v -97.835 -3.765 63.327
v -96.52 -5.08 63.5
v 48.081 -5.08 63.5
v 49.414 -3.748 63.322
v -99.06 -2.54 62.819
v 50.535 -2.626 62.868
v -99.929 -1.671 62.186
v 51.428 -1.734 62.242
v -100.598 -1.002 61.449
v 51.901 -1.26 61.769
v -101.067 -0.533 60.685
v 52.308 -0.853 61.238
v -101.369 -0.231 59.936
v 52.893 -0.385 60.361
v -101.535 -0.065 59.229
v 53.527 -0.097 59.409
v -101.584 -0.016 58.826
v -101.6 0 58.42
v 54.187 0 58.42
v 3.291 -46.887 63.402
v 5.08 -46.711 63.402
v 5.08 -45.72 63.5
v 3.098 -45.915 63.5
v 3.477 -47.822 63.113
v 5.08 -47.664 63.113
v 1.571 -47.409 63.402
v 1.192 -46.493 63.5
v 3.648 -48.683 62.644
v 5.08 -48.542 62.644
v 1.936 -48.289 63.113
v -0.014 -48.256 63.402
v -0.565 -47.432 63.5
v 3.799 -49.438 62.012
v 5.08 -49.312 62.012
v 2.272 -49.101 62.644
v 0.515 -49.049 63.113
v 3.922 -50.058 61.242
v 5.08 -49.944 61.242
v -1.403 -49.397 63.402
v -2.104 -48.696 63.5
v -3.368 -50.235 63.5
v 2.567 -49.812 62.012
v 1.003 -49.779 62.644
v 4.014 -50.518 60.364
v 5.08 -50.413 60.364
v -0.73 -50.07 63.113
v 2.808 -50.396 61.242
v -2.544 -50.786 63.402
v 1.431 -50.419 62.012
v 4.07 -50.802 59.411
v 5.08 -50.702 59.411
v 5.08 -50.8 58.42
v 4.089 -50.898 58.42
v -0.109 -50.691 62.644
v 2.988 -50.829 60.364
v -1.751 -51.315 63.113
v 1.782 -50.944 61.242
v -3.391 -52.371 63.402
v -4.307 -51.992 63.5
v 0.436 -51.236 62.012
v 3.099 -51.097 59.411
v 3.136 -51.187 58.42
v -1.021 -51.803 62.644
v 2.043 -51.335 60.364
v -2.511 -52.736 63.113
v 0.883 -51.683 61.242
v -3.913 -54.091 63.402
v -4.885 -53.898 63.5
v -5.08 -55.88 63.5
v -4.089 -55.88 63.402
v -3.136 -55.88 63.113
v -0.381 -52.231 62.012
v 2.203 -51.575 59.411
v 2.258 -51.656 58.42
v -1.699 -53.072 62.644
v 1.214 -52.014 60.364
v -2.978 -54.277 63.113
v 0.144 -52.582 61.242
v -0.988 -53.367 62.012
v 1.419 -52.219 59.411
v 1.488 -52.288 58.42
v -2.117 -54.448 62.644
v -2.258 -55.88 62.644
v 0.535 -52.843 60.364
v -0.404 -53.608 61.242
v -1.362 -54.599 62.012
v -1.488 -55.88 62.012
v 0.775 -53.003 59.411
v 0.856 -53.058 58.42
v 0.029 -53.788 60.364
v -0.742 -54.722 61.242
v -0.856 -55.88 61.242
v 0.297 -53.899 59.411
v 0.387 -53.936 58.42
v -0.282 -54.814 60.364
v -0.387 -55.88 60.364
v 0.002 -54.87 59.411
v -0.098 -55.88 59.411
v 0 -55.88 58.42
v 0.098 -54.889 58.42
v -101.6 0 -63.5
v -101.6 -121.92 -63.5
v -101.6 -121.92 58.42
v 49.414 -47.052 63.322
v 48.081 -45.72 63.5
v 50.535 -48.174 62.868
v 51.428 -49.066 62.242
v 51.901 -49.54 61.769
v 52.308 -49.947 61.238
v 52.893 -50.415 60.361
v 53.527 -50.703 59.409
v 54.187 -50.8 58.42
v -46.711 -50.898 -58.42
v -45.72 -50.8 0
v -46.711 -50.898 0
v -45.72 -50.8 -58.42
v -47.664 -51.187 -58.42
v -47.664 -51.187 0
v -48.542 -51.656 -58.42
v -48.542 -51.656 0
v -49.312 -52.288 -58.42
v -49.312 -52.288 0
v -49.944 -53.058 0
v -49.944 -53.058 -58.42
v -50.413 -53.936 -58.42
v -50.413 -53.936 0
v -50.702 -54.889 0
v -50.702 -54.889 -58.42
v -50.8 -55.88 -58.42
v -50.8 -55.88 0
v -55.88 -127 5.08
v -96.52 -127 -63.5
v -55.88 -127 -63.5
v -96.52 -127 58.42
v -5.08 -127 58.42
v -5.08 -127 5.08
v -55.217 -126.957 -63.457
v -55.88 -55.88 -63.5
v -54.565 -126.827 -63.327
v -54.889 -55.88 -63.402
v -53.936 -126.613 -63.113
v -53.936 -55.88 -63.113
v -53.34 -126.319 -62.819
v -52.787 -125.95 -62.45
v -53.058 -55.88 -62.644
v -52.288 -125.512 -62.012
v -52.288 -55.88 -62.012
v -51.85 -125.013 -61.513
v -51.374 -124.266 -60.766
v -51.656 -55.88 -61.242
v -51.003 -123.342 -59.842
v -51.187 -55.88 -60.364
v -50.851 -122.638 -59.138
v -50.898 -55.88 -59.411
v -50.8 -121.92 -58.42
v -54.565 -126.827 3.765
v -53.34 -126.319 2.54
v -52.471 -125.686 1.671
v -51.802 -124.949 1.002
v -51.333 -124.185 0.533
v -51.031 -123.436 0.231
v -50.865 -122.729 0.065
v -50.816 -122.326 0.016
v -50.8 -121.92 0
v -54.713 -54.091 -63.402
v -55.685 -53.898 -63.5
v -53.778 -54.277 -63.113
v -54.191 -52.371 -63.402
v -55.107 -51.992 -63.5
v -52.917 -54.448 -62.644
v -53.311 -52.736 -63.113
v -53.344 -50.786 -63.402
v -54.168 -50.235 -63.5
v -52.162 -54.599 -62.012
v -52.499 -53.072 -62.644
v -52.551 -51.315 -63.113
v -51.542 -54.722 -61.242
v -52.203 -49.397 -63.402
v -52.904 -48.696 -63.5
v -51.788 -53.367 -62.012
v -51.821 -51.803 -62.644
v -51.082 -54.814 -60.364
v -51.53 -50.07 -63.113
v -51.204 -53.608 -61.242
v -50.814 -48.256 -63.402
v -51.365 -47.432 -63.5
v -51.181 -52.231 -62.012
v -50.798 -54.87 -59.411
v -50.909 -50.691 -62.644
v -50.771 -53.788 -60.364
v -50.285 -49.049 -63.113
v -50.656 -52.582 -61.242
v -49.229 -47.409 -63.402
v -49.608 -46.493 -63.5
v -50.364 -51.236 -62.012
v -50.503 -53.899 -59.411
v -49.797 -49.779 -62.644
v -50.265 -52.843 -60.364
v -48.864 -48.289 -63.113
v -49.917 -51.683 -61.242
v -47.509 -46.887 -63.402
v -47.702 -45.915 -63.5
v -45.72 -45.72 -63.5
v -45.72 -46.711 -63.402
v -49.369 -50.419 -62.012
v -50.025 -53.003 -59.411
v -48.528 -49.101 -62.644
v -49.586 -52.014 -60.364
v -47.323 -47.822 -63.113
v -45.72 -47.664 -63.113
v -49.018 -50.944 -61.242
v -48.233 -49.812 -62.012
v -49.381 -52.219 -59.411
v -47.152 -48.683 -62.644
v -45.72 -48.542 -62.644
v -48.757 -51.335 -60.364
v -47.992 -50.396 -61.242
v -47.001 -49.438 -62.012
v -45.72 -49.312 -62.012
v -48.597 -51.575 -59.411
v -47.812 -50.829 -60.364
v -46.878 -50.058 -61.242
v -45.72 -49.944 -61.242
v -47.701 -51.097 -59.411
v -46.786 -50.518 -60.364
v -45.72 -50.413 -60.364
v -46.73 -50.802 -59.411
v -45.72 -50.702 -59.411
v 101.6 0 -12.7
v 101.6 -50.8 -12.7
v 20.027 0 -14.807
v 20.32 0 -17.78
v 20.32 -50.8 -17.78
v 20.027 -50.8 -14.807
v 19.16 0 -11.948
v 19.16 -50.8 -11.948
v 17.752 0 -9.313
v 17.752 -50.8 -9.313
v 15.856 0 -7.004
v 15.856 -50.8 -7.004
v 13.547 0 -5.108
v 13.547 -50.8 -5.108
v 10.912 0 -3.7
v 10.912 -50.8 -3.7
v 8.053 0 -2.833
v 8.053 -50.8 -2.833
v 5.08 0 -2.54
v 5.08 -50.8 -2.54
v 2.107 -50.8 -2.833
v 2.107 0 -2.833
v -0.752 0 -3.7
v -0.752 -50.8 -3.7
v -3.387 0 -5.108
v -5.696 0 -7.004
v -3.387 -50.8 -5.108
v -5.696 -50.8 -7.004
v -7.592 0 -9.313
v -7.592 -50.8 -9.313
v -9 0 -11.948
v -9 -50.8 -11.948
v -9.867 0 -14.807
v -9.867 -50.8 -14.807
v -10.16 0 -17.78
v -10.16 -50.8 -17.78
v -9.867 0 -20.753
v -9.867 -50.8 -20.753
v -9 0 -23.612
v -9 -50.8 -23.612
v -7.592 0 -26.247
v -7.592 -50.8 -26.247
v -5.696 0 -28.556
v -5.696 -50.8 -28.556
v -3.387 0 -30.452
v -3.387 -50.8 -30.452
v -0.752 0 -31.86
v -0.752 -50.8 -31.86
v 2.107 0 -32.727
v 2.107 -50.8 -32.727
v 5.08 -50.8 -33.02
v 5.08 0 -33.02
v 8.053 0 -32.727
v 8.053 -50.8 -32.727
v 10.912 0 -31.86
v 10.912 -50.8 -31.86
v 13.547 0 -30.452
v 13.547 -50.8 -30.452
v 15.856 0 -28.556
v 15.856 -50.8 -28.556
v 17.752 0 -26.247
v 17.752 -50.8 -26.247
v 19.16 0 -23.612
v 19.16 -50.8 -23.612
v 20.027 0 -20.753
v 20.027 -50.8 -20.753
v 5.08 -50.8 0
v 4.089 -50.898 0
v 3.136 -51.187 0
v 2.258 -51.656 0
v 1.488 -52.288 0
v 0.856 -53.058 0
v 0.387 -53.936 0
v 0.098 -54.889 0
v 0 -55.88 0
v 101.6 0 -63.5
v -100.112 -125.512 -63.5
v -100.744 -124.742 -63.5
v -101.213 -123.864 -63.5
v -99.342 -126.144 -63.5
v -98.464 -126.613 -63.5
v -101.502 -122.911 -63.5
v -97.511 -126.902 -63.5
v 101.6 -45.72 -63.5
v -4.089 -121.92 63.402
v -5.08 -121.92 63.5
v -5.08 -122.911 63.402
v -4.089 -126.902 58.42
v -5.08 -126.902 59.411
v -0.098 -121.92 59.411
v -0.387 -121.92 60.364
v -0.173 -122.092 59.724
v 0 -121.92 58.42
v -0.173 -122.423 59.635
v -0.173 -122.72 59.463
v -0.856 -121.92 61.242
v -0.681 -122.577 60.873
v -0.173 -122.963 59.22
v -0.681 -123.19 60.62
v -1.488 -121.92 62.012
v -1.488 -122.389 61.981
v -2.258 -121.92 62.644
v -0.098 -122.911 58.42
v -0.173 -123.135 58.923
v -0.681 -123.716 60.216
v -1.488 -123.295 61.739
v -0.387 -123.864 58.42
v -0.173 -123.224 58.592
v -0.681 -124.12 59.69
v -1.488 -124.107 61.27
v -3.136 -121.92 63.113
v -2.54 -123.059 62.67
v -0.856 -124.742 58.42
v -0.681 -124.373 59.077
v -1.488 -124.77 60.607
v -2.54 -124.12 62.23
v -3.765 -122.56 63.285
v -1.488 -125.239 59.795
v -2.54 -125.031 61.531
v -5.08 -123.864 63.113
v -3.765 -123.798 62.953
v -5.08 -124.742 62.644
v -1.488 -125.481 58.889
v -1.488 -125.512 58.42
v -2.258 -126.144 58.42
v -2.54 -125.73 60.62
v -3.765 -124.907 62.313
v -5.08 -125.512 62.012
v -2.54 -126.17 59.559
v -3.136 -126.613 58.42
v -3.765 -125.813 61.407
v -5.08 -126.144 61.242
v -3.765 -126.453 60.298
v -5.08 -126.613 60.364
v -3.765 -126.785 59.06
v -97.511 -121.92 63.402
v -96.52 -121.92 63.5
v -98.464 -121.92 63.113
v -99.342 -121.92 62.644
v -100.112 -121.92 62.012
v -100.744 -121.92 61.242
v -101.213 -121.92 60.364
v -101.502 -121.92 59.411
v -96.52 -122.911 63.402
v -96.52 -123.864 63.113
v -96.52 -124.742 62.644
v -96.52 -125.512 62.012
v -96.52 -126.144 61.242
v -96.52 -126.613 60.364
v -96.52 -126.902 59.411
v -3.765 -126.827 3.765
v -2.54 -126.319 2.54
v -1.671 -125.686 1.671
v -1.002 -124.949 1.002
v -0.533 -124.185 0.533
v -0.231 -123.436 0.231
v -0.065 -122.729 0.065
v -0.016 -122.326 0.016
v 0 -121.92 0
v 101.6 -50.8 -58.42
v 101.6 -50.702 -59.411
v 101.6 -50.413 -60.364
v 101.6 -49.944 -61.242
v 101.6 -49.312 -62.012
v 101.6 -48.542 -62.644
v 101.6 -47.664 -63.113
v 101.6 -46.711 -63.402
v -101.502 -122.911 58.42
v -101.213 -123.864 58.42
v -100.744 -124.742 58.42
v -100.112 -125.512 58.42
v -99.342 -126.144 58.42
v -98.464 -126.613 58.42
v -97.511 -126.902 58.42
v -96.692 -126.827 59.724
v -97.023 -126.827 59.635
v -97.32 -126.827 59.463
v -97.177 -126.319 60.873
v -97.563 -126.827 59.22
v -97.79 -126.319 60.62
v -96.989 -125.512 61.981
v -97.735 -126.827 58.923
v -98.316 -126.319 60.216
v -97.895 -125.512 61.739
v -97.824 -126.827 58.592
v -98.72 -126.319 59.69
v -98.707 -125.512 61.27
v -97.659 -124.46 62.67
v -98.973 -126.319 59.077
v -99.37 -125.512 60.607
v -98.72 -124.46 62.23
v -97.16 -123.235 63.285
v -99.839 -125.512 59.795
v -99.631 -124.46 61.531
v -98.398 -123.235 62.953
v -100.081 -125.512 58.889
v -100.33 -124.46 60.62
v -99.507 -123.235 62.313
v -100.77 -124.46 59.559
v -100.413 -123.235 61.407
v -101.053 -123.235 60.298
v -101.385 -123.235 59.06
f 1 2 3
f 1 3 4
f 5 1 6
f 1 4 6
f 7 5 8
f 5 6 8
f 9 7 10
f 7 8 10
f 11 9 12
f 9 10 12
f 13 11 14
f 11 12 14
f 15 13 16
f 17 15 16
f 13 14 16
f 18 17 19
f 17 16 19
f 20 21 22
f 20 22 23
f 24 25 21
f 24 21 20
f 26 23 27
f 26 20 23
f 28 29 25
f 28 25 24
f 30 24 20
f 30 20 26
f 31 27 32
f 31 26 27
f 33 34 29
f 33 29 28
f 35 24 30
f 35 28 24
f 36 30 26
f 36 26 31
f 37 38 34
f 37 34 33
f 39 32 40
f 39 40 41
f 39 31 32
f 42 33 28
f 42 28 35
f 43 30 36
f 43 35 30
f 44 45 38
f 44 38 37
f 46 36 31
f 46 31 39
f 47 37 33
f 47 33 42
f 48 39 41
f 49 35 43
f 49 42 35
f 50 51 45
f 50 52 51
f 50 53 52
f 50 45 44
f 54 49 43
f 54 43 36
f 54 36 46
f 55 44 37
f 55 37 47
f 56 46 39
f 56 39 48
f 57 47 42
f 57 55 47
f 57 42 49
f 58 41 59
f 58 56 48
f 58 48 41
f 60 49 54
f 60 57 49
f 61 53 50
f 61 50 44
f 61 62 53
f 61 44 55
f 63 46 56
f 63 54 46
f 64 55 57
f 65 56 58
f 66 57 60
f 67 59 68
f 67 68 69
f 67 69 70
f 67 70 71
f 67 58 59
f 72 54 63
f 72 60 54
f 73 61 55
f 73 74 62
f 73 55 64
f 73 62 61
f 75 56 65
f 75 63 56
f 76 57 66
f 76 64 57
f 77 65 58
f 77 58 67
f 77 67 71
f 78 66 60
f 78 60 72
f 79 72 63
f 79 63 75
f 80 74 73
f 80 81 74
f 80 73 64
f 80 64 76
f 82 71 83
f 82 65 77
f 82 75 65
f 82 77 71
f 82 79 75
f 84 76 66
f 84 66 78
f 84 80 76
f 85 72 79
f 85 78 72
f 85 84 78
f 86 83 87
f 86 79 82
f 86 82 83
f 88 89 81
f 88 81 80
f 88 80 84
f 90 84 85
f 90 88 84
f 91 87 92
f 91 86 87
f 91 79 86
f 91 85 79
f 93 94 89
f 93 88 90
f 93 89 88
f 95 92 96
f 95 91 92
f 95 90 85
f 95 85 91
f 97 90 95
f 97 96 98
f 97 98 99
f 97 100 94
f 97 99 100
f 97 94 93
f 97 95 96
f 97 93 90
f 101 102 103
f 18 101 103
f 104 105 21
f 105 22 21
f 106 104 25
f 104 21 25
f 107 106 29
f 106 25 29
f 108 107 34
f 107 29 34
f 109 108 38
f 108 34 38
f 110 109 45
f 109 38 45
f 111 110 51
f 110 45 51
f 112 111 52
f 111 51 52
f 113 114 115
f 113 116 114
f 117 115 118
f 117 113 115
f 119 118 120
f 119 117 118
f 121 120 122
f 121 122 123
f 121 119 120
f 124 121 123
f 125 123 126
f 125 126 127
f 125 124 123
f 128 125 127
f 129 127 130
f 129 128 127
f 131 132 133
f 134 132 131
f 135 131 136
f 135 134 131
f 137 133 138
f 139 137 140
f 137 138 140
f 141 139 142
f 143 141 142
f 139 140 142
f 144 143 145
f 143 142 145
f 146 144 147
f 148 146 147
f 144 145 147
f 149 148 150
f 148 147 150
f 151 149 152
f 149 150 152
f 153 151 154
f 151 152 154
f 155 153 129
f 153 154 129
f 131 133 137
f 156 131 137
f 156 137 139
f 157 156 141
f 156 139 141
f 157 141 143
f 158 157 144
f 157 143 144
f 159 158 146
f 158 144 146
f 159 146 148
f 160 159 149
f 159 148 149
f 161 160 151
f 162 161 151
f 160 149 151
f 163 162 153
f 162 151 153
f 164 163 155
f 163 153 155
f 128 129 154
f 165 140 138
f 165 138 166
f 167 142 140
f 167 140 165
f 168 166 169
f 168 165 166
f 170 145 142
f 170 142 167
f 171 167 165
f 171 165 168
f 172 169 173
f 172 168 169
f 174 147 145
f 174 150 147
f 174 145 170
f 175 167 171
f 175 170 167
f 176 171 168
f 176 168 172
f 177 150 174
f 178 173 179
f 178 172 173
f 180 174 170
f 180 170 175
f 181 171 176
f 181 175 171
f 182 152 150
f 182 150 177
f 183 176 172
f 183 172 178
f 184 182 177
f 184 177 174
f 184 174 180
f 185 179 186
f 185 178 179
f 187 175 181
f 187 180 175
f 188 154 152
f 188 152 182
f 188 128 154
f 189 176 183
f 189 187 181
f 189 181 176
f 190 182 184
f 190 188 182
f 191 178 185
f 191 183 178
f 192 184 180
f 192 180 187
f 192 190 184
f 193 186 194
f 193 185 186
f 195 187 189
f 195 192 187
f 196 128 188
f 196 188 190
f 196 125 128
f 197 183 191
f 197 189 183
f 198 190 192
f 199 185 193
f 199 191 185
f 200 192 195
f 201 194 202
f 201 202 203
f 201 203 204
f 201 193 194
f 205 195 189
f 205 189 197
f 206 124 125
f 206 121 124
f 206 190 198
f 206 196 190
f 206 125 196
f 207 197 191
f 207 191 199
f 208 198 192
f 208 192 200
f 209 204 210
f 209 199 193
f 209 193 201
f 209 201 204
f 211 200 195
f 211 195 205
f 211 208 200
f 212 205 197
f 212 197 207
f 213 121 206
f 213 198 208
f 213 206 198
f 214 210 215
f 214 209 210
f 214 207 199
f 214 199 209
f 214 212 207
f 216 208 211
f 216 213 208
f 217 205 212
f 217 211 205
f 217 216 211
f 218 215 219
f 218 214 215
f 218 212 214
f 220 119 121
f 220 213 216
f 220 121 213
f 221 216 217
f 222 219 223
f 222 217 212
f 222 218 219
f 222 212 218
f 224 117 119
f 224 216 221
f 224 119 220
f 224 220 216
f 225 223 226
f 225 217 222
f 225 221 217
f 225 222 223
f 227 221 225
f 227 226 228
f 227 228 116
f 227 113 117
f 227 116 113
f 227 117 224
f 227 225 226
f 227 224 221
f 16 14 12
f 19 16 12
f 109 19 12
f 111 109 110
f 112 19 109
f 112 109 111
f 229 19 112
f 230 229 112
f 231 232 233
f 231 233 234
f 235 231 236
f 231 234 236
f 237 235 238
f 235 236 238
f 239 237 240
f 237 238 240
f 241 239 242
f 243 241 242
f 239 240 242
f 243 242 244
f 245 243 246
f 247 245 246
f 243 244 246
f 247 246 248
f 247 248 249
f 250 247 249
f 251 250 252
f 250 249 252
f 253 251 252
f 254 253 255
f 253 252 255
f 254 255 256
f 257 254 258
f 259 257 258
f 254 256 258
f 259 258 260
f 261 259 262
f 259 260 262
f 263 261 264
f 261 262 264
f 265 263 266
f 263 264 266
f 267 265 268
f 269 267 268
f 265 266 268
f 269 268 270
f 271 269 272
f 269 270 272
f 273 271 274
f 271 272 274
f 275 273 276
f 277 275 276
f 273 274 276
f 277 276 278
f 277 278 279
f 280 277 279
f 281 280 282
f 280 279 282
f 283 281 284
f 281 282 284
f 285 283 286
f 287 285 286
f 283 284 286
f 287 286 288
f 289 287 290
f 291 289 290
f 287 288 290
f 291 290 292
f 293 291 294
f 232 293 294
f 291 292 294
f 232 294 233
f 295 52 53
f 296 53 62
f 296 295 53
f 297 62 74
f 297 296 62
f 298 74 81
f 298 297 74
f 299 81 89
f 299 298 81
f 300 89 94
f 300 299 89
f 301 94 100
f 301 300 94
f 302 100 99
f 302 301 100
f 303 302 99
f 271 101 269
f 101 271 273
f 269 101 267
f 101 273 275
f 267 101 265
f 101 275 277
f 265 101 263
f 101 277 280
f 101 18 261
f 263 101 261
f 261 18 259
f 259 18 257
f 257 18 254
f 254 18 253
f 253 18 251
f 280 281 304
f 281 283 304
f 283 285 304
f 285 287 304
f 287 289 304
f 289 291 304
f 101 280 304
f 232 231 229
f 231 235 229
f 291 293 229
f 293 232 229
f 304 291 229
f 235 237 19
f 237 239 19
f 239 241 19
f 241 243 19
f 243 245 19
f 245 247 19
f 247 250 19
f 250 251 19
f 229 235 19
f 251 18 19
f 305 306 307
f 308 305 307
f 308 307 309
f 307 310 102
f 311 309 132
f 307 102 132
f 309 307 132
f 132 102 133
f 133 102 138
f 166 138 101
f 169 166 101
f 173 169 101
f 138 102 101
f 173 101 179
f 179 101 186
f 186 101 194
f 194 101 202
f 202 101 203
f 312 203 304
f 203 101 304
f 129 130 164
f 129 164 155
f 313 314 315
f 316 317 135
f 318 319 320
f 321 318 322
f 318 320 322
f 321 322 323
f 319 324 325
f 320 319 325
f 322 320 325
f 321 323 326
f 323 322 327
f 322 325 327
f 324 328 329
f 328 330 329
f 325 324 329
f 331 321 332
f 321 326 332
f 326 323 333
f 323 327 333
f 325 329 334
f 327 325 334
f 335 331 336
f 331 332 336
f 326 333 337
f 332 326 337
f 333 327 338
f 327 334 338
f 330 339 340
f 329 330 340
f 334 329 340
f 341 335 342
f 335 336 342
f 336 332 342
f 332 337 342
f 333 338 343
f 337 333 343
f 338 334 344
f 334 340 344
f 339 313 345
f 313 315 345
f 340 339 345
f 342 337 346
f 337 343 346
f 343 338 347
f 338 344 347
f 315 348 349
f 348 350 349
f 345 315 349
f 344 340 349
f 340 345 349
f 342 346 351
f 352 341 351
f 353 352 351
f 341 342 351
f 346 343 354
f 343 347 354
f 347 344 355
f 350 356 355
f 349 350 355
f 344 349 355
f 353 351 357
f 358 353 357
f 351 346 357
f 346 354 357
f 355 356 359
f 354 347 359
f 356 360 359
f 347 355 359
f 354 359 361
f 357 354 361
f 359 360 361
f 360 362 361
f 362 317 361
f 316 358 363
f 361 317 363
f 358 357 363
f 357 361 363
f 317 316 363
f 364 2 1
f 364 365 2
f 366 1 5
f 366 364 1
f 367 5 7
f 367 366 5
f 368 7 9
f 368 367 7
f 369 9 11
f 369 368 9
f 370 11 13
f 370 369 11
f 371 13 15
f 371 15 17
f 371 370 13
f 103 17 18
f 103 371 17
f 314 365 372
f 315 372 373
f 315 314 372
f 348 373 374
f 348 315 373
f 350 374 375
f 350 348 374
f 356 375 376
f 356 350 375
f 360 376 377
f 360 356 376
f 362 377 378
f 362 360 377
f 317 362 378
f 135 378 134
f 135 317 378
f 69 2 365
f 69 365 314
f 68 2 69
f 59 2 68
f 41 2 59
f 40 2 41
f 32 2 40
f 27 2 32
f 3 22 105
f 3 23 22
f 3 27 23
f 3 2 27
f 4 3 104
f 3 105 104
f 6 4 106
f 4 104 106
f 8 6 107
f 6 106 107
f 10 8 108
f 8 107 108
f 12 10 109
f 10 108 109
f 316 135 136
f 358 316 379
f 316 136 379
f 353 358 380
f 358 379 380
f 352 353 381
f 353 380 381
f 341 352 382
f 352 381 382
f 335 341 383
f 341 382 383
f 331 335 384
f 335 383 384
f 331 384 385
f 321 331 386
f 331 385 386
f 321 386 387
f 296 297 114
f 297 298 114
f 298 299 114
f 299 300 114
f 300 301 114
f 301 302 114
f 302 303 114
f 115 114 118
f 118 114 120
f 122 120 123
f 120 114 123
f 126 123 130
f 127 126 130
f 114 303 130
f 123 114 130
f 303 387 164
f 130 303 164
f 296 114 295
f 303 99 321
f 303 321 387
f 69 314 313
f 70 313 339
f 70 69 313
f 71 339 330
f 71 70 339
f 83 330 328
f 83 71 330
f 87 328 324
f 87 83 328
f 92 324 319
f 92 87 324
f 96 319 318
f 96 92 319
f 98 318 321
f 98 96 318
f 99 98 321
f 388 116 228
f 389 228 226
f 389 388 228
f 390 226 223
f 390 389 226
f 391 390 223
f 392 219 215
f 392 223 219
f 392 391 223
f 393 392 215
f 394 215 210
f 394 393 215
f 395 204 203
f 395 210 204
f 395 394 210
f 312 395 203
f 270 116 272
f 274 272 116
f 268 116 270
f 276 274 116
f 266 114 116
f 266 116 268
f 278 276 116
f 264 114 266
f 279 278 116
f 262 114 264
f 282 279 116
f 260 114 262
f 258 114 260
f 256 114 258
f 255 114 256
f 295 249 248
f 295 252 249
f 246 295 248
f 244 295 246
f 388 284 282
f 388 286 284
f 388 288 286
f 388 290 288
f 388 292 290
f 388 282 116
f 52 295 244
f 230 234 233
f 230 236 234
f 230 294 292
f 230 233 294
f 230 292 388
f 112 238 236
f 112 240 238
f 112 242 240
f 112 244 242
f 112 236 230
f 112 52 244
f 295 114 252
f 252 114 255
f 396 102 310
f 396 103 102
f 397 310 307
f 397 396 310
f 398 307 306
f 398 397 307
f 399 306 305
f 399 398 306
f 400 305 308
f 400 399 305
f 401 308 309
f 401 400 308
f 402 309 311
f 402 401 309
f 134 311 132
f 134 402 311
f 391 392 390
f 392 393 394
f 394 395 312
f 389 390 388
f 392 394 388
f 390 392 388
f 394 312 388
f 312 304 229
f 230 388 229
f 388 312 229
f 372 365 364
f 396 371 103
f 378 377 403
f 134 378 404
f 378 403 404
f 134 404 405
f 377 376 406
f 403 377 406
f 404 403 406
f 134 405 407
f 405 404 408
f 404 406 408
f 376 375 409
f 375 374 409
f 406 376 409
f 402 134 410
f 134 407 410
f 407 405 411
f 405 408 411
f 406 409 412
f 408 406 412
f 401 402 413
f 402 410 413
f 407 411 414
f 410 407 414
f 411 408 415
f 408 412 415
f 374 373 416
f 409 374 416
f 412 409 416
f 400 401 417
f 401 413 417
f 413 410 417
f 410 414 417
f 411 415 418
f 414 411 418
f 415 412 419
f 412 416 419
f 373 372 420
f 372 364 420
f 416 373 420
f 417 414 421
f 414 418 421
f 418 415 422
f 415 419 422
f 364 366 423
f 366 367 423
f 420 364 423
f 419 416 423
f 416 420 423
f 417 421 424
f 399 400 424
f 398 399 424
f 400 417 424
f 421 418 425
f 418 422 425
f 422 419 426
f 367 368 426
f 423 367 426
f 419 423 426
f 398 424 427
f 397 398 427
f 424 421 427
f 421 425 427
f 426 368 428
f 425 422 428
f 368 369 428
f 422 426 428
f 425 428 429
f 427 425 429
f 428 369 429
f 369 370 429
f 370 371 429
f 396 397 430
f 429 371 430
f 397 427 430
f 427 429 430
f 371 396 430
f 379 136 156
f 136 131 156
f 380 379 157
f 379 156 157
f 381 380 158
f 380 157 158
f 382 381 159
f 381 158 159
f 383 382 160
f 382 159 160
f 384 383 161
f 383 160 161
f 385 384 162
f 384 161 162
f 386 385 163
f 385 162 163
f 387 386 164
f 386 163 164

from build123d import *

# Parameters (mm, degrees)
F0_W     = 203.2
F0_H     = 127
F1_DEPTH = 127
F3_DEPTH = 76.2
F4_SIZE2 = 76.2
F4_SIZE  = 50.8
F5_R     = 5.08
F6_R     = 15.24
F7_DEPTH = 50.8


with BuildPart() as f1:
    # F0 (on Front) → F1 (new body)
    with BuildSketch(Plane.XZ):
        Rectangle(F0_W, F0_H)
    extrude(amount=F1_DEPTH)

    # F2 (on face) → F3 (cut)
    with BuildSketch(Plane.XZ.offset(127)):
        Polygon((101.6, 63.5), (0, 63.5), (0, 0), (-50.8, 0), (-50.8, -63.5), (101.6, -63.5), align=None)
    extrude(amount=-F3_DEPTH, mode=Mode.SUBTRACT)

    # F4
    f4_edges = [f1.edges().sort_by_distance(p)[0] for p in [
        (101.6, -25.4, 63.5),
    ]]
    f4_side = f1.faces().sort_by_distance((-21.771429, -52.614286, 63.5))[0]
    chamfer(f4_edges, length=F4_SIZE, length2=F4_SIZE2, reference=f4_side)

    # F5
    f5_edges = [f1.edges().sort_by_distance(p)[0] for p in [
        (25.4, -50.8, 63.5),
        (-25.4, 0, 63.5),
        (50.8, -25.4, 63.5),
        (-101.6, -63.5, 63.5),
        (-50.8, -127, 63.5),
        (0, -88.9, 63.5),
        (0, -127, 31.75),
        (0, -50.8, 31.75),
        (-50.8, -88.9, -63.5),
        (25.4, -50.8, -63.5),
        (-50.8, -50.8, -31.75),
        (-50.8, -127, -31.75),
        (-25.4, -127, 0),
        (-101.6, -127, 0),
    ]]
    fillet(f5_edges, radius=F5_R)

    # F6 (on face) → F7 (cut, through all)
    with BuildSketch(Plane.XZ.offset(50.8)):
        with Locations((5.08, -17.78)):
            Circle(F6_R)
    extrude(amount=-F7_DEPTH, mode=Mode.SUBTRACT)


solid = f1.part
